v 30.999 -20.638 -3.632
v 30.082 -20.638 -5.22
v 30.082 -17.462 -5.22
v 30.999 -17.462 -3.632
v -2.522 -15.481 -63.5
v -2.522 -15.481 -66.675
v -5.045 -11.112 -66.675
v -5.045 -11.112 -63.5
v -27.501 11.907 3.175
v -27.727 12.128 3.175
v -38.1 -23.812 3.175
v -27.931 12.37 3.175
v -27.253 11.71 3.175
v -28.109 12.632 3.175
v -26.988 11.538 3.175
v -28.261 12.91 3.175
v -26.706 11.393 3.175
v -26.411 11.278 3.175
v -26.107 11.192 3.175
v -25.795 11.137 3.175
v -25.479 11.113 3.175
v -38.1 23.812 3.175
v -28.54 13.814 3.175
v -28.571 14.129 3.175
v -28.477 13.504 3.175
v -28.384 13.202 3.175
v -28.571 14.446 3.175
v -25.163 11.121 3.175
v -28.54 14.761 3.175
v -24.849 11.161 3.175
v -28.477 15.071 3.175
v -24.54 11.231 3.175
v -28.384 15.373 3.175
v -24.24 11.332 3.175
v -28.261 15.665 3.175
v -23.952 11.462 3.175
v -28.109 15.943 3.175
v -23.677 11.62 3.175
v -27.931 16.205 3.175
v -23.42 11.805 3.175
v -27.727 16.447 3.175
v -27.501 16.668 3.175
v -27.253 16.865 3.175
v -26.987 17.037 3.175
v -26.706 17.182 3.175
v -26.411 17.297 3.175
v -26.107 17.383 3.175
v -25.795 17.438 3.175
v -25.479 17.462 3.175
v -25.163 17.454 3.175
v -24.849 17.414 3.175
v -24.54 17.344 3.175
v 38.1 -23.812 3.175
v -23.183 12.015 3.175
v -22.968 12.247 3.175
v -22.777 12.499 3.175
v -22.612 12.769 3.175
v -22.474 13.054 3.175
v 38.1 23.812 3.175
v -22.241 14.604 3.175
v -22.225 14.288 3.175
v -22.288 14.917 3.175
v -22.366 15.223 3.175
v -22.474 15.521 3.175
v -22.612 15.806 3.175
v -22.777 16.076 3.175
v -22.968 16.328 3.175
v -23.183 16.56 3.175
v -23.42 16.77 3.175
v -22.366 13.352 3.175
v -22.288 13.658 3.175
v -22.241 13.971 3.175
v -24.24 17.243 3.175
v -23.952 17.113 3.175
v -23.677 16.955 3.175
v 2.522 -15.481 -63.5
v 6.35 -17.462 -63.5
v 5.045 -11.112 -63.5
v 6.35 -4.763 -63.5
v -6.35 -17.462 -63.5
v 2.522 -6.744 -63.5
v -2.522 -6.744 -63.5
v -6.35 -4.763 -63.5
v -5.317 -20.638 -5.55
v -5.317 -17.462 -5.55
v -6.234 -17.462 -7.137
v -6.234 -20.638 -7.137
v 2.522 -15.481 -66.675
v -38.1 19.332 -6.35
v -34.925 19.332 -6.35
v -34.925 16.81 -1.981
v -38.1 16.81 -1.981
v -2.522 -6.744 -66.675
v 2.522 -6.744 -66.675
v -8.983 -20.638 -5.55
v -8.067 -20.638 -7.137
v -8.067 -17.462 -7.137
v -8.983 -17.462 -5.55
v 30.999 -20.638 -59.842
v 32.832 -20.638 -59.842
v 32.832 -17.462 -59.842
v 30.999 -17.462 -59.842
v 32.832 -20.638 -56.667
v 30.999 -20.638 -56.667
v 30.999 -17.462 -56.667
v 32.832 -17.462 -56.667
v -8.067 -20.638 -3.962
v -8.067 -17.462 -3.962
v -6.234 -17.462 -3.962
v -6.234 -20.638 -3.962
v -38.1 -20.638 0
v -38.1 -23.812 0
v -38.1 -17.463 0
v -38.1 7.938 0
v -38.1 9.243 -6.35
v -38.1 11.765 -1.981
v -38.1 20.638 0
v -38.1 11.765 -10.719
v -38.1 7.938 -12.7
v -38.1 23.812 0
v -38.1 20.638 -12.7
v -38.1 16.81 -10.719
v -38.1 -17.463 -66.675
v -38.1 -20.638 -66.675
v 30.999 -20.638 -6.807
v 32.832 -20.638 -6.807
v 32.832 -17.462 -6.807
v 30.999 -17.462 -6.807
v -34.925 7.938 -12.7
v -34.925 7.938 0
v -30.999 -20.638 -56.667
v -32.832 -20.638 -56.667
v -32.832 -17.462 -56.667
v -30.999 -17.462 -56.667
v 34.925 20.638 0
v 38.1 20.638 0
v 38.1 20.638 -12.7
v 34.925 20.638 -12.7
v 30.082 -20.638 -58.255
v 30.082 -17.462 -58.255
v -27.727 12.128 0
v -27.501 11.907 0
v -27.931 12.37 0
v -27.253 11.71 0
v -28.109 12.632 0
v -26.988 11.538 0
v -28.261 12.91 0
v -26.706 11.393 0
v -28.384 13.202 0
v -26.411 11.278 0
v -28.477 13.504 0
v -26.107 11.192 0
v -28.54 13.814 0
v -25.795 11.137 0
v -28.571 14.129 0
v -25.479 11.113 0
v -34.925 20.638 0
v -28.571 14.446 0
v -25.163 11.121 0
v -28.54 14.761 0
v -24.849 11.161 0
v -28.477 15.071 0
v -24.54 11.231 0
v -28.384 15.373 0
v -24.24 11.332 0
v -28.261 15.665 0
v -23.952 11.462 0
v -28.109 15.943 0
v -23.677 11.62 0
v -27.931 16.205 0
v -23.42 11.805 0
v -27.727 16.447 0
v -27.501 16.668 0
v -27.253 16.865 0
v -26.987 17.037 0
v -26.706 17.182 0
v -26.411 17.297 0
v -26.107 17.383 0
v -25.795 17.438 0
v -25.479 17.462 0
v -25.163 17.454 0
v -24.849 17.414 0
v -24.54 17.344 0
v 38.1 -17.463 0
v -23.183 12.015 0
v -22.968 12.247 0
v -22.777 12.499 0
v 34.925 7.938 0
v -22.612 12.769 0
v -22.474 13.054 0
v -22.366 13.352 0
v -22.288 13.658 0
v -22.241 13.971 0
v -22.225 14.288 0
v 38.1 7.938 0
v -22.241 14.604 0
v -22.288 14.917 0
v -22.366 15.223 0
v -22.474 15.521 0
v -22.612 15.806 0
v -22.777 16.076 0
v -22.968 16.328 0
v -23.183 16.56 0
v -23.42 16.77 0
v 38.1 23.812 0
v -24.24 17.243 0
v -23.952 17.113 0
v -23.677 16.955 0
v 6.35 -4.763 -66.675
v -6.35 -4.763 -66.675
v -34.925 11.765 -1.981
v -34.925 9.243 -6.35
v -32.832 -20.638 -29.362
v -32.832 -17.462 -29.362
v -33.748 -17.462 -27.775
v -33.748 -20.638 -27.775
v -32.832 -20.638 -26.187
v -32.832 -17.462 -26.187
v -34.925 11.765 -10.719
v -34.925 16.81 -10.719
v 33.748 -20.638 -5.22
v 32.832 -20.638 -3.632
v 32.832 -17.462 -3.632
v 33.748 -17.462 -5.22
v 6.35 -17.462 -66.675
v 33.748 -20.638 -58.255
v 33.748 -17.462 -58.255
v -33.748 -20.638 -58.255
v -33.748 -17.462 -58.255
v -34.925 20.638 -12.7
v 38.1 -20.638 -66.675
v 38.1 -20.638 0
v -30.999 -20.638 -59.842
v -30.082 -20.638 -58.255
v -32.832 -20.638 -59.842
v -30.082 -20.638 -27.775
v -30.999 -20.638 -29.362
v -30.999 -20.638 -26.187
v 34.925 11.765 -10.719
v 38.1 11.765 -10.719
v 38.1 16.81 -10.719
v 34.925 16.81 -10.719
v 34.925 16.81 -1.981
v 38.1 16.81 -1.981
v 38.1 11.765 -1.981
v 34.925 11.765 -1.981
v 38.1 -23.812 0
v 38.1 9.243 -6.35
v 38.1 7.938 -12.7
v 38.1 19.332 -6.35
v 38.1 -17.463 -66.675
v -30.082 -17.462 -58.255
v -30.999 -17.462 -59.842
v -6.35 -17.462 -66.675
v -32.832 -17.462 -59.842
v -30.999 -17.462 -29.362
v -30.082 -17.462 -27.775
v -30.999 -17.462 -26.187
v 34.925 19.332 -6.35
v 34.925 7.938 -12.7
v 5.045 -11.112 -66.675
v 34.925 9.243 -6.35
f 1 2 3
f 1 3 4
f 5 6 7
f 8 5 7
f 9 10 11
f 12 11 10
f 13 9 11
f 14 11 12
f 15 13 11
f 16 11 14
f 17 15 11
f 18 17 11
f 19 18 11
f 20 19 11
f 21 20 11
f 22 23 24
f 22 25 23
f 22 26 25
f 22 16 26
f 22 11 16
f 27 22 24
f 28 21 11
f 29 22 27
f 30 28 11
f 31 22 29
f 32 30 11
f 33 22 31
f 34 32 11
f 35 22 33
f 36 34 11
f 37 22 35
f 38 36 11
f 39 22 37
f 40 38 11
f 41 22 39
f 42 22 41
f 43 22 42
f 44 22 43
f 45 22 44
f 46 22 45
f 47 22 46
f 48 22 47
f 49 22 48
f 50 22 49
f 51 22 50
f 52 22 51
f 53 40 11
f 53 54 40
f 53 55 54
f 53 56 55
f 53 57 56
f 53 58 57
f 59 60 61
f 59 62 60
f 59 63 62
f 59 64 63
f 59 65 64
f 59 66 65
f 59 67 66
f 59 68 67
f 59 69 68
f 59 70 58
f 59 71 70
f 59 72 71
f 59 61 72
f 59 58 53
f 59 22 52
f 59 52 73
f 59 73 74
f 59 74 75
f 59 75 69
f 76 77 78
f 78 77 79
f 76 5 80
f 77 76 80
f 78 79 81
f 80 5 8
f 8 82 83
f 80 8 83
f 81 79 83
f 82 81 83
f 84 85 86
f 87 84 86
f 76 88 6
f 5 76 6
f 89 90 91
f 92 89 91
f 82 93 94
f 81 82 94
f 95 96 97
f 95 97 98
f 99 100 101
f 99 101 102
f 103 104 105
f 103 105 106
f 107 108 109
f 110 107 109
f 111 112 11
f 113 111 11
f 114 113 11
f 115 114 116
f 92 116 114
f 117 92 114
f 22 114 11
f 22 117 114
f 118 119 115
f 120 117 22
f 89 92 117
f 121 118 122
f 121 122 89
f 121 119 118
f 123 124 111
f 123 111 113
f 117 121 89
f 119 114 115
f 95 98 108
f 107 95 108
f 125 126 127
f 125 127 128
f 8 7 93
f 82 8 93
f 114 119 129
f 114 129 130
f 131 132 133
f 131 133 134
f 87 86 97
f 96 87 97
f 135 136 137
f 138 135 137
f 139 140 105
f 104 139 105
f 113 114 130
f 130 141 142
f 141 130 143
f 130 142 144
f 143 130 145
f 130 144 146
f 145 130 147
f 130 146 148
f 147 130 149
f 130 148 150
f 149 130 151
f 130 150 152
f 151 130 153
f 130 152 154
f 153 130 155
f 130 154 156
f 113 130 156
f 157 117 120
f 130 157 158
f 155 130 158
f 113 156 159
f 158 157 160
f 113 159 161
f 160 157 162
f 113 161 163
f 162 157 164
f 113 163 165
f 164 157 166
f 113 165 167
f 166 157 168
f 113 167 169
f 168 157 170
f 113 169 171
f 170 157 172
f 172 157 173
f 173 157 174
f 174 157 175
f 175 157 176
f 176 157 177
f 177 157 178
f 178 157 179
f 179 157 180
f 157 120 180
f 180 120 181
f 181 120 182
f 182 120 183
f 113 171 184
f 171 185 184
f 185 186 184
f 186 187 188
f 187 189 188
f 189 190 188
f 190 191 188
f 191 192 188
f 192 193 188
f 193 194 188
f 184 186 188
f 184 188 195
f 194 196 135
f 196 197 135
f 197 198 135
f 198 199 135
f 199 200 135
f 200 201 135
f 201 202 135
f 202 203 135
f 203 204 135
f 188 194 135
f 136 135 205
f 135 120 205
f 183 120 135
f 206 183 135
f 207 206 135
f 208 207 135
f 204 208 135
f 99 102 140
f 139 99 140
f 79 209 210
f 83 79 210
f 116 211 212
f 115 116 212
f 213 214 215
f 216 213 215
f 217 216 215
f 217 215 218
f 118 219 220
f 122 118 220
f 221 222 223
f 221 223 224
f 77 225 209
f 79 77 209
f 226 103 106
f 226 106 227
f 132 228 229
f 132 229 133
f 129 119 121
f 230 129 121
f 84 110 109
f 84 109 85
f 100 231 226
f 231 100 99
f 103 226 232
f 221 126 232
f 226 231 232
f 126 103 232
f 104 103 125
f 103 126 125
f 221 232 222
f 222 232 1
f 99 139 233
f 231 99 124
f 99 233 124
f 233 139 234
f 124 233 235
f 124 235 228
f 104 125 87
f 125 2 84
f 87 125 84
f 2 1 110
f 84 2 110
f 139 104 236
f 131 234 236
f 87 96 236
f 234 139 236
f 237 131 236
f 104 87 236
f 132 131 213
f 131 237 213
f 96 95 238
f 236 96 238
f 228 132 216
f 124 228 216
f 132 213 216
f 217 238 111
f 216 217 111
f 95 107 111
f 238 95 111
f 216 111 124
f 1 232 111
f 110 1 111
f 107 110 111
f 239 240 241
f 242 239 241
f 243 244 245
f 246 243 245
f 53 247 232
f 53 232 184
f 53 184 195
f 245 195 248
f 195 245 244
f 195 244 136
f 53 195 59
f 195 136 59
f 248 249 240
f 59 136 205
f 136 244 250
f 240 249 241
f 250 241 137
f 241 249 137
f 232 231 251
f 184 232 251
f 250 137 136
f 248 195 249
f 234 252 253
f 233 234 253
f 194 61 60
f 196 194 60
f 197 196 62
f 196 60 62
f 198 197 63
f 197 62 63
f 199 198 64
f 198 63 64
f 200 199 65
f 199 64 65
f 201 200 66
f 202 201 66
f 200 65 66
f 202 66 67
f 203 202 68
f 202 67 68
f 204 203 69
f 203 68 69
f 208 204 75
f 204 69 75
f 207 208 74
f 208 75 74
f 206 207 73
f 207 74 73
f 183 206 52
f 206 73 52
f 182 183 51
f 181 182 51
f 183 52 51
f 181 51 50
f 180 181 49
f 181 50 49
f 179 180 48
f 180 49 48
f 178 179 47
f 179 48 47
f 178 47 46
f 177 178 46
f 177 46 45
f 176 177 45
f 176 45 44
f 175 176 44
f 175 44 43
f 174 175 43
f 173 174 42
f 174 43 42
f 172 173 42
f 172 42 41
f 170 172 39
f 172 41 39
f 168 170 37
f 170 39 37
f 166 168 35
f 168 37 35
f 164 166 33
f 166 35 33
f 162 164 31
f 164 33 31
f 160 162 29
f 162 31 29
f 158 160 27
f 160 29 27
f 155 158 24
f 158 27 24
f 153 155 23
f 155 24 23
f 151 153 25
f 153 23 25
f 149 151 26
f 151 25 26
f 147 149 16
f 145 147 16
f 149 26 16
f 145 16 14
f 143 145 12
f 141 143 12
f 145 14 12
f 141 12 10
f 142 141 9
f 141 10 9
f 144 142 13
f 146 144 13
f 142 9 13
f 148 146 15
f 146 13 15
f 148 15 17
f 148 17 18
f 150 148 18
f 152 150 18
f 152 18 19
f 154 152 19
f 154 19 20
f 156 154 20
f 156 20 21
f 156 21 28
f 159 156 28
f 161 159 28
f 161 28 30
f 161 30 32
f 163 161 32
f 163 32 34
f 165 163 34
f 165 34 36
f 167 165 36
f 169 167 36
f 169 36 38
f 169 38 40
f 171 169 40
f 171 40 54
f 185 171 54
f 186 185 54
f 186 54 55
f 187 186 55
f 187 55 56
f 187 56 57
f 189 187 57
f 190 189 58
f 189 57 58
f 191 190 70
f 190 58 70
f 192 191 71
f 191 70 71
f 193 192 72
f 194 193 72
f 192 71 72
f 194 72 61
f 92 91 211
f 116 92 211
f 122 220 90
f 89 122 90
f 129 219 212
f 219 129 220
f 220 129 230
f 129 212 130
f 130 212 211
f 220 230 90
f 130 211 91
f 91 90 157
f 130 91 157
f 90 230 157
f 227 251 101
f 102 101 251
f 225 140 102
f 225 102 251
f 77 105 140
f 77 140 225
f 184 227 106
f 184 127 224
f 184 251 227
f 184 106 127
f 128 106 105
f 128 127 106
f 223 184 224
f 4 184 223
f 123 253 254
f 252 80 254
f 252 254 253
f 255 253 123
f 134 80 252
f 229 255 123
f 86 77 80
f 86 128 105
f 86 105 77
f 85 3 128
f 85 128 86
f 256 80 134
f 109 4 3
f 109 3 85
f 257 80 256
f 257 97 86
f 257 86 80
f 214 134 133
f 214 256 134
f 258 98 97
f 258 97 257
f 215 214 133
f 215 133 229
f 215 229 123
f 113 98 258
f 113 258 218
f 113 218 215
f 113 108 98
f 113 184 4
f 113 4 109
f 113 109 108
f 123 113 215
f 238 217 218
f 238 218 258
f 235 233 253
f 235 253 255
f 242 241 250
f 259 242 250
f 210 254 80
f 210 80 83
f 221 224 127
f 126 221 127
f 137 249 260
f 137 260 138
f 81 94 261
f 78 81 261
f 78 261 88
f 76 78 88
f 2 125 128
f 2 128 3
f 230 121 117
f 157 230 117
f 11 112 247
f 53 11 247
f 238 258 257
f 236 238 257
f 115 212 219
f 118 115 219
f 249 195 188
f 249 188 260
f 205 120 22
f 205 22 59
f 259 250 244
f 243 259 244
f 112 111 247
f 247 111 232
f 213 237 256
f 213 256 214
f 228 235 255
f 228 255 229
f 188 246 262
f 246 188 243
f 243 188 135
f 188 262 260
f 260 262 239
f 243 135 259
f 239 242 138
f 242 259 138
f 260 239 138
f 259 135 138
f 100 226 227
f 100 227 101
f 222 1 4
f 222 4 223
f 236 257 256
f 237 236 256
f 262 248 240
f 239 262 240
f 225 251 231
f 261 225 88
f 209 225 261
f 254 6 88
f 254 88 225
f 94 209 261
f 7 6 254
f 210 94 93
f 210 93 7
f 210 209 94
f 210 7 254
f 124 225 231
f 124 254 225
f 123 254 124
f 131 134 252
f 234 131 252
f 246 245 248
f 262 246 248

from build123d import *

# Parameters (mm, degrees)
SKETCH1_W               = 76.2
SKETCH1_H               = 47.625
BOSS_EXTRUDE1_DEPTH     = 3.175
SKETCH2_W               = 76.2
SKETCH2_H               = 3.175
BOSS_EXTRUDE2_DEPTH     = 66.675
SKETCH6_W               = 12.7
SKETCH6_H               = 12.7
BOSS_EXTRUDE4_DEPTH     = 3.175
SKETCH7_W               = 12.7
SKETCH7_H               = 12.7
BOSS_EXTRUDE5_DEPTH     = 3.175
SKETCH8_W               = 12.7
SKETCH8_H               = 12.7
BOSS_EXTRUDE6_DEPTH     = 3.175
CUT_EXTRUDE4_DEPTH      = 3.175
CUT_EXTRUDE5_DEPTH      = 1
CUT_EXTRUDE5_DEPTH_BACK = 77.2
SKETCH11_R              = 3.175
CUT_EXTRUDE6_DEPTH      = 3.175
CUT_EXTRUDE7_DEPTH      = 3.175


with BuildPart() as part:
    # Sketch1 → Boss-Extrude1 (new body)
    with BuildSketch(Plane.XY):
        Rectangle(SKETCH1_W, SKETCH1_H)
    extrude(amount=BOSS_EXTRUDE1_DEPTH)

    # Sketch2 → Boss-Extrude2 (add)
    with BuildSketch(Plane(origin=(0, 0, 0), x_dir=(-1, 0, 0), z_dir=(0, 0, -1))):
        with Locations((0, -19.05)):
            Rectangle(SKETCH2_W, SKETCH2_H)
    extrude(amount=BOSS_EXTRUDE2_DEPTH)

    # Sketch6 → Boss-Extrude4 (add)
    with BuildSketch(Plane(origin=(38.1, 0, 0), x_dir=(0, 0, -1), z_dir=(1, 0, 0))):
        with Locations((6.35, 14.2875)):
            Rectangle(SKETCH6_W, SKETCH6_H)
    extrude(amount=-BOSS_EXTRUDE4_DEPTH)

    # Sketch7 → Boss-Extrude5 (add)
    with BuildSketch(Plane.ZY.offset(38.1)):
        with Locations((-6.35, 14.2875)):
            Rectangle(SKETCH7_W, SKETCH7_H)
    extrude(amount=-BOSS_EXTRUDE5_DEPTH)

    # Sketch8 → Boss-Extrude6 (add)
    with BuildSketch(Plane(origin=(0, 0, -66.675), x_dir=(-1, 0, 0), z_dir=(0, 0, -1))):
        with Locations((0, -11.1125)):
            Rectangle(SKETCH8_W, SKETCH8_H)
    extrude(amount=-BOSS_EXTRUDE6_DEPTH)

    # Sketch9 → Cut-Extrude4 (cut)
    with BuildSketch(Plane(origin=(0, 0, -66.675), x_dir=(-1, 0, 0), z_dir=(0, 0, -1))):
        Polygon((2.522327856, -6.7437), (-2.522327856, -6.7437), (-5.044655712, -11.1125), (-2.522327856, -15.4813), (2.522327856, -15.4813), (5.044655712, -11.1125), align=None)
    extrude(amount=-CUT_EXTRUDE4_DEPTH, mode=Mode.SUBTRACT)

    # Sketch10 → Cut-Extrude5 (cut, two sides)
    with BuildSketch(Plane(origin=(38.1, 0, 0), x_dir=(0, 0, -1), z_dir=(1, 0, 0))) as cut_extrude5_sk:
        Polygon((10.7188, 11.765172144), (10.7188, 16.809827856), (6.35, 19.332155712), (1.9812, 16.809827856), (1.9812, 11.765172144), (6.35, 9.242844288), align=None)
    extrude(amount=CUT_EXTRUDE5_DEPTH, mode=Mode.SUBTRACT)
    extrude(cut_extrude5_sk.sketch, amount=-CUT_EXTRUDE5_DEPTH_BACK, mode=Mode.SUBTRACT)

    # Sketch11 → Cut-Extrude6 (cut)
    with BuildSketch(Plane.XY.offset(3.175)):
        with Locations((-25.4, 14.2875)):
            Circle(SKETCH11_R)
    extrude(amount=-CUT_EXTRUDE6_DEPTH, mode=Mode.SUBTRACT)

    # Sketch12 → Cut-Extrude7 (cut)
    with BuildSketch(Plane(origin=(0, -17.4625, 0), x_dir=(1, 0, 0), z_dir=(0, 1, 0))):
        Polygon((-8.983187105, 5.5499), (-8.066643552, 3.9624), (-6.233556448, 3.9624), (-5.317012895, 5.5499), (-6.233556448, 7.1374), (-8.066643552, 7.1374), align=None)
        Polygon((32.831643552, 3.6322), (33.748187105, 5.2197), (32.831643552, 6.8072), (30.998556448, 6.8072), (30.082012895, 5.2197), (30.998556448, 3.6322), align=None)
        Polygon((33.748187105, 58.2549), (32.831643552, 59.8424), (30.998556448, 59.8424), (30.082012895, 58.2549), (30.998556448, 56.6674), (32.831643552, 56.6674), align=None)
        Polygon((-30.998556448, 29.3624), (-32.831643552, 29.3624), (-33.748187105, 27.7749), (-32.831643552, 26.1874), (-30.998556448, 26.1874), (-30.082012895, 27.7749), align=None)
        Polygon((-30.082012895, 58.2549), (-30.998556448, 59.8424), (-32.831643552, 59.8424), (-33.748187105, 58.2549), (-32.831643552, 56.6674), (-30.998556448, 56.6674), align=None)
    extrude(amount=-CUT_EXTRUDE7_DEPTH, mode=Mode.SUBTRACT)


solid = part.part
